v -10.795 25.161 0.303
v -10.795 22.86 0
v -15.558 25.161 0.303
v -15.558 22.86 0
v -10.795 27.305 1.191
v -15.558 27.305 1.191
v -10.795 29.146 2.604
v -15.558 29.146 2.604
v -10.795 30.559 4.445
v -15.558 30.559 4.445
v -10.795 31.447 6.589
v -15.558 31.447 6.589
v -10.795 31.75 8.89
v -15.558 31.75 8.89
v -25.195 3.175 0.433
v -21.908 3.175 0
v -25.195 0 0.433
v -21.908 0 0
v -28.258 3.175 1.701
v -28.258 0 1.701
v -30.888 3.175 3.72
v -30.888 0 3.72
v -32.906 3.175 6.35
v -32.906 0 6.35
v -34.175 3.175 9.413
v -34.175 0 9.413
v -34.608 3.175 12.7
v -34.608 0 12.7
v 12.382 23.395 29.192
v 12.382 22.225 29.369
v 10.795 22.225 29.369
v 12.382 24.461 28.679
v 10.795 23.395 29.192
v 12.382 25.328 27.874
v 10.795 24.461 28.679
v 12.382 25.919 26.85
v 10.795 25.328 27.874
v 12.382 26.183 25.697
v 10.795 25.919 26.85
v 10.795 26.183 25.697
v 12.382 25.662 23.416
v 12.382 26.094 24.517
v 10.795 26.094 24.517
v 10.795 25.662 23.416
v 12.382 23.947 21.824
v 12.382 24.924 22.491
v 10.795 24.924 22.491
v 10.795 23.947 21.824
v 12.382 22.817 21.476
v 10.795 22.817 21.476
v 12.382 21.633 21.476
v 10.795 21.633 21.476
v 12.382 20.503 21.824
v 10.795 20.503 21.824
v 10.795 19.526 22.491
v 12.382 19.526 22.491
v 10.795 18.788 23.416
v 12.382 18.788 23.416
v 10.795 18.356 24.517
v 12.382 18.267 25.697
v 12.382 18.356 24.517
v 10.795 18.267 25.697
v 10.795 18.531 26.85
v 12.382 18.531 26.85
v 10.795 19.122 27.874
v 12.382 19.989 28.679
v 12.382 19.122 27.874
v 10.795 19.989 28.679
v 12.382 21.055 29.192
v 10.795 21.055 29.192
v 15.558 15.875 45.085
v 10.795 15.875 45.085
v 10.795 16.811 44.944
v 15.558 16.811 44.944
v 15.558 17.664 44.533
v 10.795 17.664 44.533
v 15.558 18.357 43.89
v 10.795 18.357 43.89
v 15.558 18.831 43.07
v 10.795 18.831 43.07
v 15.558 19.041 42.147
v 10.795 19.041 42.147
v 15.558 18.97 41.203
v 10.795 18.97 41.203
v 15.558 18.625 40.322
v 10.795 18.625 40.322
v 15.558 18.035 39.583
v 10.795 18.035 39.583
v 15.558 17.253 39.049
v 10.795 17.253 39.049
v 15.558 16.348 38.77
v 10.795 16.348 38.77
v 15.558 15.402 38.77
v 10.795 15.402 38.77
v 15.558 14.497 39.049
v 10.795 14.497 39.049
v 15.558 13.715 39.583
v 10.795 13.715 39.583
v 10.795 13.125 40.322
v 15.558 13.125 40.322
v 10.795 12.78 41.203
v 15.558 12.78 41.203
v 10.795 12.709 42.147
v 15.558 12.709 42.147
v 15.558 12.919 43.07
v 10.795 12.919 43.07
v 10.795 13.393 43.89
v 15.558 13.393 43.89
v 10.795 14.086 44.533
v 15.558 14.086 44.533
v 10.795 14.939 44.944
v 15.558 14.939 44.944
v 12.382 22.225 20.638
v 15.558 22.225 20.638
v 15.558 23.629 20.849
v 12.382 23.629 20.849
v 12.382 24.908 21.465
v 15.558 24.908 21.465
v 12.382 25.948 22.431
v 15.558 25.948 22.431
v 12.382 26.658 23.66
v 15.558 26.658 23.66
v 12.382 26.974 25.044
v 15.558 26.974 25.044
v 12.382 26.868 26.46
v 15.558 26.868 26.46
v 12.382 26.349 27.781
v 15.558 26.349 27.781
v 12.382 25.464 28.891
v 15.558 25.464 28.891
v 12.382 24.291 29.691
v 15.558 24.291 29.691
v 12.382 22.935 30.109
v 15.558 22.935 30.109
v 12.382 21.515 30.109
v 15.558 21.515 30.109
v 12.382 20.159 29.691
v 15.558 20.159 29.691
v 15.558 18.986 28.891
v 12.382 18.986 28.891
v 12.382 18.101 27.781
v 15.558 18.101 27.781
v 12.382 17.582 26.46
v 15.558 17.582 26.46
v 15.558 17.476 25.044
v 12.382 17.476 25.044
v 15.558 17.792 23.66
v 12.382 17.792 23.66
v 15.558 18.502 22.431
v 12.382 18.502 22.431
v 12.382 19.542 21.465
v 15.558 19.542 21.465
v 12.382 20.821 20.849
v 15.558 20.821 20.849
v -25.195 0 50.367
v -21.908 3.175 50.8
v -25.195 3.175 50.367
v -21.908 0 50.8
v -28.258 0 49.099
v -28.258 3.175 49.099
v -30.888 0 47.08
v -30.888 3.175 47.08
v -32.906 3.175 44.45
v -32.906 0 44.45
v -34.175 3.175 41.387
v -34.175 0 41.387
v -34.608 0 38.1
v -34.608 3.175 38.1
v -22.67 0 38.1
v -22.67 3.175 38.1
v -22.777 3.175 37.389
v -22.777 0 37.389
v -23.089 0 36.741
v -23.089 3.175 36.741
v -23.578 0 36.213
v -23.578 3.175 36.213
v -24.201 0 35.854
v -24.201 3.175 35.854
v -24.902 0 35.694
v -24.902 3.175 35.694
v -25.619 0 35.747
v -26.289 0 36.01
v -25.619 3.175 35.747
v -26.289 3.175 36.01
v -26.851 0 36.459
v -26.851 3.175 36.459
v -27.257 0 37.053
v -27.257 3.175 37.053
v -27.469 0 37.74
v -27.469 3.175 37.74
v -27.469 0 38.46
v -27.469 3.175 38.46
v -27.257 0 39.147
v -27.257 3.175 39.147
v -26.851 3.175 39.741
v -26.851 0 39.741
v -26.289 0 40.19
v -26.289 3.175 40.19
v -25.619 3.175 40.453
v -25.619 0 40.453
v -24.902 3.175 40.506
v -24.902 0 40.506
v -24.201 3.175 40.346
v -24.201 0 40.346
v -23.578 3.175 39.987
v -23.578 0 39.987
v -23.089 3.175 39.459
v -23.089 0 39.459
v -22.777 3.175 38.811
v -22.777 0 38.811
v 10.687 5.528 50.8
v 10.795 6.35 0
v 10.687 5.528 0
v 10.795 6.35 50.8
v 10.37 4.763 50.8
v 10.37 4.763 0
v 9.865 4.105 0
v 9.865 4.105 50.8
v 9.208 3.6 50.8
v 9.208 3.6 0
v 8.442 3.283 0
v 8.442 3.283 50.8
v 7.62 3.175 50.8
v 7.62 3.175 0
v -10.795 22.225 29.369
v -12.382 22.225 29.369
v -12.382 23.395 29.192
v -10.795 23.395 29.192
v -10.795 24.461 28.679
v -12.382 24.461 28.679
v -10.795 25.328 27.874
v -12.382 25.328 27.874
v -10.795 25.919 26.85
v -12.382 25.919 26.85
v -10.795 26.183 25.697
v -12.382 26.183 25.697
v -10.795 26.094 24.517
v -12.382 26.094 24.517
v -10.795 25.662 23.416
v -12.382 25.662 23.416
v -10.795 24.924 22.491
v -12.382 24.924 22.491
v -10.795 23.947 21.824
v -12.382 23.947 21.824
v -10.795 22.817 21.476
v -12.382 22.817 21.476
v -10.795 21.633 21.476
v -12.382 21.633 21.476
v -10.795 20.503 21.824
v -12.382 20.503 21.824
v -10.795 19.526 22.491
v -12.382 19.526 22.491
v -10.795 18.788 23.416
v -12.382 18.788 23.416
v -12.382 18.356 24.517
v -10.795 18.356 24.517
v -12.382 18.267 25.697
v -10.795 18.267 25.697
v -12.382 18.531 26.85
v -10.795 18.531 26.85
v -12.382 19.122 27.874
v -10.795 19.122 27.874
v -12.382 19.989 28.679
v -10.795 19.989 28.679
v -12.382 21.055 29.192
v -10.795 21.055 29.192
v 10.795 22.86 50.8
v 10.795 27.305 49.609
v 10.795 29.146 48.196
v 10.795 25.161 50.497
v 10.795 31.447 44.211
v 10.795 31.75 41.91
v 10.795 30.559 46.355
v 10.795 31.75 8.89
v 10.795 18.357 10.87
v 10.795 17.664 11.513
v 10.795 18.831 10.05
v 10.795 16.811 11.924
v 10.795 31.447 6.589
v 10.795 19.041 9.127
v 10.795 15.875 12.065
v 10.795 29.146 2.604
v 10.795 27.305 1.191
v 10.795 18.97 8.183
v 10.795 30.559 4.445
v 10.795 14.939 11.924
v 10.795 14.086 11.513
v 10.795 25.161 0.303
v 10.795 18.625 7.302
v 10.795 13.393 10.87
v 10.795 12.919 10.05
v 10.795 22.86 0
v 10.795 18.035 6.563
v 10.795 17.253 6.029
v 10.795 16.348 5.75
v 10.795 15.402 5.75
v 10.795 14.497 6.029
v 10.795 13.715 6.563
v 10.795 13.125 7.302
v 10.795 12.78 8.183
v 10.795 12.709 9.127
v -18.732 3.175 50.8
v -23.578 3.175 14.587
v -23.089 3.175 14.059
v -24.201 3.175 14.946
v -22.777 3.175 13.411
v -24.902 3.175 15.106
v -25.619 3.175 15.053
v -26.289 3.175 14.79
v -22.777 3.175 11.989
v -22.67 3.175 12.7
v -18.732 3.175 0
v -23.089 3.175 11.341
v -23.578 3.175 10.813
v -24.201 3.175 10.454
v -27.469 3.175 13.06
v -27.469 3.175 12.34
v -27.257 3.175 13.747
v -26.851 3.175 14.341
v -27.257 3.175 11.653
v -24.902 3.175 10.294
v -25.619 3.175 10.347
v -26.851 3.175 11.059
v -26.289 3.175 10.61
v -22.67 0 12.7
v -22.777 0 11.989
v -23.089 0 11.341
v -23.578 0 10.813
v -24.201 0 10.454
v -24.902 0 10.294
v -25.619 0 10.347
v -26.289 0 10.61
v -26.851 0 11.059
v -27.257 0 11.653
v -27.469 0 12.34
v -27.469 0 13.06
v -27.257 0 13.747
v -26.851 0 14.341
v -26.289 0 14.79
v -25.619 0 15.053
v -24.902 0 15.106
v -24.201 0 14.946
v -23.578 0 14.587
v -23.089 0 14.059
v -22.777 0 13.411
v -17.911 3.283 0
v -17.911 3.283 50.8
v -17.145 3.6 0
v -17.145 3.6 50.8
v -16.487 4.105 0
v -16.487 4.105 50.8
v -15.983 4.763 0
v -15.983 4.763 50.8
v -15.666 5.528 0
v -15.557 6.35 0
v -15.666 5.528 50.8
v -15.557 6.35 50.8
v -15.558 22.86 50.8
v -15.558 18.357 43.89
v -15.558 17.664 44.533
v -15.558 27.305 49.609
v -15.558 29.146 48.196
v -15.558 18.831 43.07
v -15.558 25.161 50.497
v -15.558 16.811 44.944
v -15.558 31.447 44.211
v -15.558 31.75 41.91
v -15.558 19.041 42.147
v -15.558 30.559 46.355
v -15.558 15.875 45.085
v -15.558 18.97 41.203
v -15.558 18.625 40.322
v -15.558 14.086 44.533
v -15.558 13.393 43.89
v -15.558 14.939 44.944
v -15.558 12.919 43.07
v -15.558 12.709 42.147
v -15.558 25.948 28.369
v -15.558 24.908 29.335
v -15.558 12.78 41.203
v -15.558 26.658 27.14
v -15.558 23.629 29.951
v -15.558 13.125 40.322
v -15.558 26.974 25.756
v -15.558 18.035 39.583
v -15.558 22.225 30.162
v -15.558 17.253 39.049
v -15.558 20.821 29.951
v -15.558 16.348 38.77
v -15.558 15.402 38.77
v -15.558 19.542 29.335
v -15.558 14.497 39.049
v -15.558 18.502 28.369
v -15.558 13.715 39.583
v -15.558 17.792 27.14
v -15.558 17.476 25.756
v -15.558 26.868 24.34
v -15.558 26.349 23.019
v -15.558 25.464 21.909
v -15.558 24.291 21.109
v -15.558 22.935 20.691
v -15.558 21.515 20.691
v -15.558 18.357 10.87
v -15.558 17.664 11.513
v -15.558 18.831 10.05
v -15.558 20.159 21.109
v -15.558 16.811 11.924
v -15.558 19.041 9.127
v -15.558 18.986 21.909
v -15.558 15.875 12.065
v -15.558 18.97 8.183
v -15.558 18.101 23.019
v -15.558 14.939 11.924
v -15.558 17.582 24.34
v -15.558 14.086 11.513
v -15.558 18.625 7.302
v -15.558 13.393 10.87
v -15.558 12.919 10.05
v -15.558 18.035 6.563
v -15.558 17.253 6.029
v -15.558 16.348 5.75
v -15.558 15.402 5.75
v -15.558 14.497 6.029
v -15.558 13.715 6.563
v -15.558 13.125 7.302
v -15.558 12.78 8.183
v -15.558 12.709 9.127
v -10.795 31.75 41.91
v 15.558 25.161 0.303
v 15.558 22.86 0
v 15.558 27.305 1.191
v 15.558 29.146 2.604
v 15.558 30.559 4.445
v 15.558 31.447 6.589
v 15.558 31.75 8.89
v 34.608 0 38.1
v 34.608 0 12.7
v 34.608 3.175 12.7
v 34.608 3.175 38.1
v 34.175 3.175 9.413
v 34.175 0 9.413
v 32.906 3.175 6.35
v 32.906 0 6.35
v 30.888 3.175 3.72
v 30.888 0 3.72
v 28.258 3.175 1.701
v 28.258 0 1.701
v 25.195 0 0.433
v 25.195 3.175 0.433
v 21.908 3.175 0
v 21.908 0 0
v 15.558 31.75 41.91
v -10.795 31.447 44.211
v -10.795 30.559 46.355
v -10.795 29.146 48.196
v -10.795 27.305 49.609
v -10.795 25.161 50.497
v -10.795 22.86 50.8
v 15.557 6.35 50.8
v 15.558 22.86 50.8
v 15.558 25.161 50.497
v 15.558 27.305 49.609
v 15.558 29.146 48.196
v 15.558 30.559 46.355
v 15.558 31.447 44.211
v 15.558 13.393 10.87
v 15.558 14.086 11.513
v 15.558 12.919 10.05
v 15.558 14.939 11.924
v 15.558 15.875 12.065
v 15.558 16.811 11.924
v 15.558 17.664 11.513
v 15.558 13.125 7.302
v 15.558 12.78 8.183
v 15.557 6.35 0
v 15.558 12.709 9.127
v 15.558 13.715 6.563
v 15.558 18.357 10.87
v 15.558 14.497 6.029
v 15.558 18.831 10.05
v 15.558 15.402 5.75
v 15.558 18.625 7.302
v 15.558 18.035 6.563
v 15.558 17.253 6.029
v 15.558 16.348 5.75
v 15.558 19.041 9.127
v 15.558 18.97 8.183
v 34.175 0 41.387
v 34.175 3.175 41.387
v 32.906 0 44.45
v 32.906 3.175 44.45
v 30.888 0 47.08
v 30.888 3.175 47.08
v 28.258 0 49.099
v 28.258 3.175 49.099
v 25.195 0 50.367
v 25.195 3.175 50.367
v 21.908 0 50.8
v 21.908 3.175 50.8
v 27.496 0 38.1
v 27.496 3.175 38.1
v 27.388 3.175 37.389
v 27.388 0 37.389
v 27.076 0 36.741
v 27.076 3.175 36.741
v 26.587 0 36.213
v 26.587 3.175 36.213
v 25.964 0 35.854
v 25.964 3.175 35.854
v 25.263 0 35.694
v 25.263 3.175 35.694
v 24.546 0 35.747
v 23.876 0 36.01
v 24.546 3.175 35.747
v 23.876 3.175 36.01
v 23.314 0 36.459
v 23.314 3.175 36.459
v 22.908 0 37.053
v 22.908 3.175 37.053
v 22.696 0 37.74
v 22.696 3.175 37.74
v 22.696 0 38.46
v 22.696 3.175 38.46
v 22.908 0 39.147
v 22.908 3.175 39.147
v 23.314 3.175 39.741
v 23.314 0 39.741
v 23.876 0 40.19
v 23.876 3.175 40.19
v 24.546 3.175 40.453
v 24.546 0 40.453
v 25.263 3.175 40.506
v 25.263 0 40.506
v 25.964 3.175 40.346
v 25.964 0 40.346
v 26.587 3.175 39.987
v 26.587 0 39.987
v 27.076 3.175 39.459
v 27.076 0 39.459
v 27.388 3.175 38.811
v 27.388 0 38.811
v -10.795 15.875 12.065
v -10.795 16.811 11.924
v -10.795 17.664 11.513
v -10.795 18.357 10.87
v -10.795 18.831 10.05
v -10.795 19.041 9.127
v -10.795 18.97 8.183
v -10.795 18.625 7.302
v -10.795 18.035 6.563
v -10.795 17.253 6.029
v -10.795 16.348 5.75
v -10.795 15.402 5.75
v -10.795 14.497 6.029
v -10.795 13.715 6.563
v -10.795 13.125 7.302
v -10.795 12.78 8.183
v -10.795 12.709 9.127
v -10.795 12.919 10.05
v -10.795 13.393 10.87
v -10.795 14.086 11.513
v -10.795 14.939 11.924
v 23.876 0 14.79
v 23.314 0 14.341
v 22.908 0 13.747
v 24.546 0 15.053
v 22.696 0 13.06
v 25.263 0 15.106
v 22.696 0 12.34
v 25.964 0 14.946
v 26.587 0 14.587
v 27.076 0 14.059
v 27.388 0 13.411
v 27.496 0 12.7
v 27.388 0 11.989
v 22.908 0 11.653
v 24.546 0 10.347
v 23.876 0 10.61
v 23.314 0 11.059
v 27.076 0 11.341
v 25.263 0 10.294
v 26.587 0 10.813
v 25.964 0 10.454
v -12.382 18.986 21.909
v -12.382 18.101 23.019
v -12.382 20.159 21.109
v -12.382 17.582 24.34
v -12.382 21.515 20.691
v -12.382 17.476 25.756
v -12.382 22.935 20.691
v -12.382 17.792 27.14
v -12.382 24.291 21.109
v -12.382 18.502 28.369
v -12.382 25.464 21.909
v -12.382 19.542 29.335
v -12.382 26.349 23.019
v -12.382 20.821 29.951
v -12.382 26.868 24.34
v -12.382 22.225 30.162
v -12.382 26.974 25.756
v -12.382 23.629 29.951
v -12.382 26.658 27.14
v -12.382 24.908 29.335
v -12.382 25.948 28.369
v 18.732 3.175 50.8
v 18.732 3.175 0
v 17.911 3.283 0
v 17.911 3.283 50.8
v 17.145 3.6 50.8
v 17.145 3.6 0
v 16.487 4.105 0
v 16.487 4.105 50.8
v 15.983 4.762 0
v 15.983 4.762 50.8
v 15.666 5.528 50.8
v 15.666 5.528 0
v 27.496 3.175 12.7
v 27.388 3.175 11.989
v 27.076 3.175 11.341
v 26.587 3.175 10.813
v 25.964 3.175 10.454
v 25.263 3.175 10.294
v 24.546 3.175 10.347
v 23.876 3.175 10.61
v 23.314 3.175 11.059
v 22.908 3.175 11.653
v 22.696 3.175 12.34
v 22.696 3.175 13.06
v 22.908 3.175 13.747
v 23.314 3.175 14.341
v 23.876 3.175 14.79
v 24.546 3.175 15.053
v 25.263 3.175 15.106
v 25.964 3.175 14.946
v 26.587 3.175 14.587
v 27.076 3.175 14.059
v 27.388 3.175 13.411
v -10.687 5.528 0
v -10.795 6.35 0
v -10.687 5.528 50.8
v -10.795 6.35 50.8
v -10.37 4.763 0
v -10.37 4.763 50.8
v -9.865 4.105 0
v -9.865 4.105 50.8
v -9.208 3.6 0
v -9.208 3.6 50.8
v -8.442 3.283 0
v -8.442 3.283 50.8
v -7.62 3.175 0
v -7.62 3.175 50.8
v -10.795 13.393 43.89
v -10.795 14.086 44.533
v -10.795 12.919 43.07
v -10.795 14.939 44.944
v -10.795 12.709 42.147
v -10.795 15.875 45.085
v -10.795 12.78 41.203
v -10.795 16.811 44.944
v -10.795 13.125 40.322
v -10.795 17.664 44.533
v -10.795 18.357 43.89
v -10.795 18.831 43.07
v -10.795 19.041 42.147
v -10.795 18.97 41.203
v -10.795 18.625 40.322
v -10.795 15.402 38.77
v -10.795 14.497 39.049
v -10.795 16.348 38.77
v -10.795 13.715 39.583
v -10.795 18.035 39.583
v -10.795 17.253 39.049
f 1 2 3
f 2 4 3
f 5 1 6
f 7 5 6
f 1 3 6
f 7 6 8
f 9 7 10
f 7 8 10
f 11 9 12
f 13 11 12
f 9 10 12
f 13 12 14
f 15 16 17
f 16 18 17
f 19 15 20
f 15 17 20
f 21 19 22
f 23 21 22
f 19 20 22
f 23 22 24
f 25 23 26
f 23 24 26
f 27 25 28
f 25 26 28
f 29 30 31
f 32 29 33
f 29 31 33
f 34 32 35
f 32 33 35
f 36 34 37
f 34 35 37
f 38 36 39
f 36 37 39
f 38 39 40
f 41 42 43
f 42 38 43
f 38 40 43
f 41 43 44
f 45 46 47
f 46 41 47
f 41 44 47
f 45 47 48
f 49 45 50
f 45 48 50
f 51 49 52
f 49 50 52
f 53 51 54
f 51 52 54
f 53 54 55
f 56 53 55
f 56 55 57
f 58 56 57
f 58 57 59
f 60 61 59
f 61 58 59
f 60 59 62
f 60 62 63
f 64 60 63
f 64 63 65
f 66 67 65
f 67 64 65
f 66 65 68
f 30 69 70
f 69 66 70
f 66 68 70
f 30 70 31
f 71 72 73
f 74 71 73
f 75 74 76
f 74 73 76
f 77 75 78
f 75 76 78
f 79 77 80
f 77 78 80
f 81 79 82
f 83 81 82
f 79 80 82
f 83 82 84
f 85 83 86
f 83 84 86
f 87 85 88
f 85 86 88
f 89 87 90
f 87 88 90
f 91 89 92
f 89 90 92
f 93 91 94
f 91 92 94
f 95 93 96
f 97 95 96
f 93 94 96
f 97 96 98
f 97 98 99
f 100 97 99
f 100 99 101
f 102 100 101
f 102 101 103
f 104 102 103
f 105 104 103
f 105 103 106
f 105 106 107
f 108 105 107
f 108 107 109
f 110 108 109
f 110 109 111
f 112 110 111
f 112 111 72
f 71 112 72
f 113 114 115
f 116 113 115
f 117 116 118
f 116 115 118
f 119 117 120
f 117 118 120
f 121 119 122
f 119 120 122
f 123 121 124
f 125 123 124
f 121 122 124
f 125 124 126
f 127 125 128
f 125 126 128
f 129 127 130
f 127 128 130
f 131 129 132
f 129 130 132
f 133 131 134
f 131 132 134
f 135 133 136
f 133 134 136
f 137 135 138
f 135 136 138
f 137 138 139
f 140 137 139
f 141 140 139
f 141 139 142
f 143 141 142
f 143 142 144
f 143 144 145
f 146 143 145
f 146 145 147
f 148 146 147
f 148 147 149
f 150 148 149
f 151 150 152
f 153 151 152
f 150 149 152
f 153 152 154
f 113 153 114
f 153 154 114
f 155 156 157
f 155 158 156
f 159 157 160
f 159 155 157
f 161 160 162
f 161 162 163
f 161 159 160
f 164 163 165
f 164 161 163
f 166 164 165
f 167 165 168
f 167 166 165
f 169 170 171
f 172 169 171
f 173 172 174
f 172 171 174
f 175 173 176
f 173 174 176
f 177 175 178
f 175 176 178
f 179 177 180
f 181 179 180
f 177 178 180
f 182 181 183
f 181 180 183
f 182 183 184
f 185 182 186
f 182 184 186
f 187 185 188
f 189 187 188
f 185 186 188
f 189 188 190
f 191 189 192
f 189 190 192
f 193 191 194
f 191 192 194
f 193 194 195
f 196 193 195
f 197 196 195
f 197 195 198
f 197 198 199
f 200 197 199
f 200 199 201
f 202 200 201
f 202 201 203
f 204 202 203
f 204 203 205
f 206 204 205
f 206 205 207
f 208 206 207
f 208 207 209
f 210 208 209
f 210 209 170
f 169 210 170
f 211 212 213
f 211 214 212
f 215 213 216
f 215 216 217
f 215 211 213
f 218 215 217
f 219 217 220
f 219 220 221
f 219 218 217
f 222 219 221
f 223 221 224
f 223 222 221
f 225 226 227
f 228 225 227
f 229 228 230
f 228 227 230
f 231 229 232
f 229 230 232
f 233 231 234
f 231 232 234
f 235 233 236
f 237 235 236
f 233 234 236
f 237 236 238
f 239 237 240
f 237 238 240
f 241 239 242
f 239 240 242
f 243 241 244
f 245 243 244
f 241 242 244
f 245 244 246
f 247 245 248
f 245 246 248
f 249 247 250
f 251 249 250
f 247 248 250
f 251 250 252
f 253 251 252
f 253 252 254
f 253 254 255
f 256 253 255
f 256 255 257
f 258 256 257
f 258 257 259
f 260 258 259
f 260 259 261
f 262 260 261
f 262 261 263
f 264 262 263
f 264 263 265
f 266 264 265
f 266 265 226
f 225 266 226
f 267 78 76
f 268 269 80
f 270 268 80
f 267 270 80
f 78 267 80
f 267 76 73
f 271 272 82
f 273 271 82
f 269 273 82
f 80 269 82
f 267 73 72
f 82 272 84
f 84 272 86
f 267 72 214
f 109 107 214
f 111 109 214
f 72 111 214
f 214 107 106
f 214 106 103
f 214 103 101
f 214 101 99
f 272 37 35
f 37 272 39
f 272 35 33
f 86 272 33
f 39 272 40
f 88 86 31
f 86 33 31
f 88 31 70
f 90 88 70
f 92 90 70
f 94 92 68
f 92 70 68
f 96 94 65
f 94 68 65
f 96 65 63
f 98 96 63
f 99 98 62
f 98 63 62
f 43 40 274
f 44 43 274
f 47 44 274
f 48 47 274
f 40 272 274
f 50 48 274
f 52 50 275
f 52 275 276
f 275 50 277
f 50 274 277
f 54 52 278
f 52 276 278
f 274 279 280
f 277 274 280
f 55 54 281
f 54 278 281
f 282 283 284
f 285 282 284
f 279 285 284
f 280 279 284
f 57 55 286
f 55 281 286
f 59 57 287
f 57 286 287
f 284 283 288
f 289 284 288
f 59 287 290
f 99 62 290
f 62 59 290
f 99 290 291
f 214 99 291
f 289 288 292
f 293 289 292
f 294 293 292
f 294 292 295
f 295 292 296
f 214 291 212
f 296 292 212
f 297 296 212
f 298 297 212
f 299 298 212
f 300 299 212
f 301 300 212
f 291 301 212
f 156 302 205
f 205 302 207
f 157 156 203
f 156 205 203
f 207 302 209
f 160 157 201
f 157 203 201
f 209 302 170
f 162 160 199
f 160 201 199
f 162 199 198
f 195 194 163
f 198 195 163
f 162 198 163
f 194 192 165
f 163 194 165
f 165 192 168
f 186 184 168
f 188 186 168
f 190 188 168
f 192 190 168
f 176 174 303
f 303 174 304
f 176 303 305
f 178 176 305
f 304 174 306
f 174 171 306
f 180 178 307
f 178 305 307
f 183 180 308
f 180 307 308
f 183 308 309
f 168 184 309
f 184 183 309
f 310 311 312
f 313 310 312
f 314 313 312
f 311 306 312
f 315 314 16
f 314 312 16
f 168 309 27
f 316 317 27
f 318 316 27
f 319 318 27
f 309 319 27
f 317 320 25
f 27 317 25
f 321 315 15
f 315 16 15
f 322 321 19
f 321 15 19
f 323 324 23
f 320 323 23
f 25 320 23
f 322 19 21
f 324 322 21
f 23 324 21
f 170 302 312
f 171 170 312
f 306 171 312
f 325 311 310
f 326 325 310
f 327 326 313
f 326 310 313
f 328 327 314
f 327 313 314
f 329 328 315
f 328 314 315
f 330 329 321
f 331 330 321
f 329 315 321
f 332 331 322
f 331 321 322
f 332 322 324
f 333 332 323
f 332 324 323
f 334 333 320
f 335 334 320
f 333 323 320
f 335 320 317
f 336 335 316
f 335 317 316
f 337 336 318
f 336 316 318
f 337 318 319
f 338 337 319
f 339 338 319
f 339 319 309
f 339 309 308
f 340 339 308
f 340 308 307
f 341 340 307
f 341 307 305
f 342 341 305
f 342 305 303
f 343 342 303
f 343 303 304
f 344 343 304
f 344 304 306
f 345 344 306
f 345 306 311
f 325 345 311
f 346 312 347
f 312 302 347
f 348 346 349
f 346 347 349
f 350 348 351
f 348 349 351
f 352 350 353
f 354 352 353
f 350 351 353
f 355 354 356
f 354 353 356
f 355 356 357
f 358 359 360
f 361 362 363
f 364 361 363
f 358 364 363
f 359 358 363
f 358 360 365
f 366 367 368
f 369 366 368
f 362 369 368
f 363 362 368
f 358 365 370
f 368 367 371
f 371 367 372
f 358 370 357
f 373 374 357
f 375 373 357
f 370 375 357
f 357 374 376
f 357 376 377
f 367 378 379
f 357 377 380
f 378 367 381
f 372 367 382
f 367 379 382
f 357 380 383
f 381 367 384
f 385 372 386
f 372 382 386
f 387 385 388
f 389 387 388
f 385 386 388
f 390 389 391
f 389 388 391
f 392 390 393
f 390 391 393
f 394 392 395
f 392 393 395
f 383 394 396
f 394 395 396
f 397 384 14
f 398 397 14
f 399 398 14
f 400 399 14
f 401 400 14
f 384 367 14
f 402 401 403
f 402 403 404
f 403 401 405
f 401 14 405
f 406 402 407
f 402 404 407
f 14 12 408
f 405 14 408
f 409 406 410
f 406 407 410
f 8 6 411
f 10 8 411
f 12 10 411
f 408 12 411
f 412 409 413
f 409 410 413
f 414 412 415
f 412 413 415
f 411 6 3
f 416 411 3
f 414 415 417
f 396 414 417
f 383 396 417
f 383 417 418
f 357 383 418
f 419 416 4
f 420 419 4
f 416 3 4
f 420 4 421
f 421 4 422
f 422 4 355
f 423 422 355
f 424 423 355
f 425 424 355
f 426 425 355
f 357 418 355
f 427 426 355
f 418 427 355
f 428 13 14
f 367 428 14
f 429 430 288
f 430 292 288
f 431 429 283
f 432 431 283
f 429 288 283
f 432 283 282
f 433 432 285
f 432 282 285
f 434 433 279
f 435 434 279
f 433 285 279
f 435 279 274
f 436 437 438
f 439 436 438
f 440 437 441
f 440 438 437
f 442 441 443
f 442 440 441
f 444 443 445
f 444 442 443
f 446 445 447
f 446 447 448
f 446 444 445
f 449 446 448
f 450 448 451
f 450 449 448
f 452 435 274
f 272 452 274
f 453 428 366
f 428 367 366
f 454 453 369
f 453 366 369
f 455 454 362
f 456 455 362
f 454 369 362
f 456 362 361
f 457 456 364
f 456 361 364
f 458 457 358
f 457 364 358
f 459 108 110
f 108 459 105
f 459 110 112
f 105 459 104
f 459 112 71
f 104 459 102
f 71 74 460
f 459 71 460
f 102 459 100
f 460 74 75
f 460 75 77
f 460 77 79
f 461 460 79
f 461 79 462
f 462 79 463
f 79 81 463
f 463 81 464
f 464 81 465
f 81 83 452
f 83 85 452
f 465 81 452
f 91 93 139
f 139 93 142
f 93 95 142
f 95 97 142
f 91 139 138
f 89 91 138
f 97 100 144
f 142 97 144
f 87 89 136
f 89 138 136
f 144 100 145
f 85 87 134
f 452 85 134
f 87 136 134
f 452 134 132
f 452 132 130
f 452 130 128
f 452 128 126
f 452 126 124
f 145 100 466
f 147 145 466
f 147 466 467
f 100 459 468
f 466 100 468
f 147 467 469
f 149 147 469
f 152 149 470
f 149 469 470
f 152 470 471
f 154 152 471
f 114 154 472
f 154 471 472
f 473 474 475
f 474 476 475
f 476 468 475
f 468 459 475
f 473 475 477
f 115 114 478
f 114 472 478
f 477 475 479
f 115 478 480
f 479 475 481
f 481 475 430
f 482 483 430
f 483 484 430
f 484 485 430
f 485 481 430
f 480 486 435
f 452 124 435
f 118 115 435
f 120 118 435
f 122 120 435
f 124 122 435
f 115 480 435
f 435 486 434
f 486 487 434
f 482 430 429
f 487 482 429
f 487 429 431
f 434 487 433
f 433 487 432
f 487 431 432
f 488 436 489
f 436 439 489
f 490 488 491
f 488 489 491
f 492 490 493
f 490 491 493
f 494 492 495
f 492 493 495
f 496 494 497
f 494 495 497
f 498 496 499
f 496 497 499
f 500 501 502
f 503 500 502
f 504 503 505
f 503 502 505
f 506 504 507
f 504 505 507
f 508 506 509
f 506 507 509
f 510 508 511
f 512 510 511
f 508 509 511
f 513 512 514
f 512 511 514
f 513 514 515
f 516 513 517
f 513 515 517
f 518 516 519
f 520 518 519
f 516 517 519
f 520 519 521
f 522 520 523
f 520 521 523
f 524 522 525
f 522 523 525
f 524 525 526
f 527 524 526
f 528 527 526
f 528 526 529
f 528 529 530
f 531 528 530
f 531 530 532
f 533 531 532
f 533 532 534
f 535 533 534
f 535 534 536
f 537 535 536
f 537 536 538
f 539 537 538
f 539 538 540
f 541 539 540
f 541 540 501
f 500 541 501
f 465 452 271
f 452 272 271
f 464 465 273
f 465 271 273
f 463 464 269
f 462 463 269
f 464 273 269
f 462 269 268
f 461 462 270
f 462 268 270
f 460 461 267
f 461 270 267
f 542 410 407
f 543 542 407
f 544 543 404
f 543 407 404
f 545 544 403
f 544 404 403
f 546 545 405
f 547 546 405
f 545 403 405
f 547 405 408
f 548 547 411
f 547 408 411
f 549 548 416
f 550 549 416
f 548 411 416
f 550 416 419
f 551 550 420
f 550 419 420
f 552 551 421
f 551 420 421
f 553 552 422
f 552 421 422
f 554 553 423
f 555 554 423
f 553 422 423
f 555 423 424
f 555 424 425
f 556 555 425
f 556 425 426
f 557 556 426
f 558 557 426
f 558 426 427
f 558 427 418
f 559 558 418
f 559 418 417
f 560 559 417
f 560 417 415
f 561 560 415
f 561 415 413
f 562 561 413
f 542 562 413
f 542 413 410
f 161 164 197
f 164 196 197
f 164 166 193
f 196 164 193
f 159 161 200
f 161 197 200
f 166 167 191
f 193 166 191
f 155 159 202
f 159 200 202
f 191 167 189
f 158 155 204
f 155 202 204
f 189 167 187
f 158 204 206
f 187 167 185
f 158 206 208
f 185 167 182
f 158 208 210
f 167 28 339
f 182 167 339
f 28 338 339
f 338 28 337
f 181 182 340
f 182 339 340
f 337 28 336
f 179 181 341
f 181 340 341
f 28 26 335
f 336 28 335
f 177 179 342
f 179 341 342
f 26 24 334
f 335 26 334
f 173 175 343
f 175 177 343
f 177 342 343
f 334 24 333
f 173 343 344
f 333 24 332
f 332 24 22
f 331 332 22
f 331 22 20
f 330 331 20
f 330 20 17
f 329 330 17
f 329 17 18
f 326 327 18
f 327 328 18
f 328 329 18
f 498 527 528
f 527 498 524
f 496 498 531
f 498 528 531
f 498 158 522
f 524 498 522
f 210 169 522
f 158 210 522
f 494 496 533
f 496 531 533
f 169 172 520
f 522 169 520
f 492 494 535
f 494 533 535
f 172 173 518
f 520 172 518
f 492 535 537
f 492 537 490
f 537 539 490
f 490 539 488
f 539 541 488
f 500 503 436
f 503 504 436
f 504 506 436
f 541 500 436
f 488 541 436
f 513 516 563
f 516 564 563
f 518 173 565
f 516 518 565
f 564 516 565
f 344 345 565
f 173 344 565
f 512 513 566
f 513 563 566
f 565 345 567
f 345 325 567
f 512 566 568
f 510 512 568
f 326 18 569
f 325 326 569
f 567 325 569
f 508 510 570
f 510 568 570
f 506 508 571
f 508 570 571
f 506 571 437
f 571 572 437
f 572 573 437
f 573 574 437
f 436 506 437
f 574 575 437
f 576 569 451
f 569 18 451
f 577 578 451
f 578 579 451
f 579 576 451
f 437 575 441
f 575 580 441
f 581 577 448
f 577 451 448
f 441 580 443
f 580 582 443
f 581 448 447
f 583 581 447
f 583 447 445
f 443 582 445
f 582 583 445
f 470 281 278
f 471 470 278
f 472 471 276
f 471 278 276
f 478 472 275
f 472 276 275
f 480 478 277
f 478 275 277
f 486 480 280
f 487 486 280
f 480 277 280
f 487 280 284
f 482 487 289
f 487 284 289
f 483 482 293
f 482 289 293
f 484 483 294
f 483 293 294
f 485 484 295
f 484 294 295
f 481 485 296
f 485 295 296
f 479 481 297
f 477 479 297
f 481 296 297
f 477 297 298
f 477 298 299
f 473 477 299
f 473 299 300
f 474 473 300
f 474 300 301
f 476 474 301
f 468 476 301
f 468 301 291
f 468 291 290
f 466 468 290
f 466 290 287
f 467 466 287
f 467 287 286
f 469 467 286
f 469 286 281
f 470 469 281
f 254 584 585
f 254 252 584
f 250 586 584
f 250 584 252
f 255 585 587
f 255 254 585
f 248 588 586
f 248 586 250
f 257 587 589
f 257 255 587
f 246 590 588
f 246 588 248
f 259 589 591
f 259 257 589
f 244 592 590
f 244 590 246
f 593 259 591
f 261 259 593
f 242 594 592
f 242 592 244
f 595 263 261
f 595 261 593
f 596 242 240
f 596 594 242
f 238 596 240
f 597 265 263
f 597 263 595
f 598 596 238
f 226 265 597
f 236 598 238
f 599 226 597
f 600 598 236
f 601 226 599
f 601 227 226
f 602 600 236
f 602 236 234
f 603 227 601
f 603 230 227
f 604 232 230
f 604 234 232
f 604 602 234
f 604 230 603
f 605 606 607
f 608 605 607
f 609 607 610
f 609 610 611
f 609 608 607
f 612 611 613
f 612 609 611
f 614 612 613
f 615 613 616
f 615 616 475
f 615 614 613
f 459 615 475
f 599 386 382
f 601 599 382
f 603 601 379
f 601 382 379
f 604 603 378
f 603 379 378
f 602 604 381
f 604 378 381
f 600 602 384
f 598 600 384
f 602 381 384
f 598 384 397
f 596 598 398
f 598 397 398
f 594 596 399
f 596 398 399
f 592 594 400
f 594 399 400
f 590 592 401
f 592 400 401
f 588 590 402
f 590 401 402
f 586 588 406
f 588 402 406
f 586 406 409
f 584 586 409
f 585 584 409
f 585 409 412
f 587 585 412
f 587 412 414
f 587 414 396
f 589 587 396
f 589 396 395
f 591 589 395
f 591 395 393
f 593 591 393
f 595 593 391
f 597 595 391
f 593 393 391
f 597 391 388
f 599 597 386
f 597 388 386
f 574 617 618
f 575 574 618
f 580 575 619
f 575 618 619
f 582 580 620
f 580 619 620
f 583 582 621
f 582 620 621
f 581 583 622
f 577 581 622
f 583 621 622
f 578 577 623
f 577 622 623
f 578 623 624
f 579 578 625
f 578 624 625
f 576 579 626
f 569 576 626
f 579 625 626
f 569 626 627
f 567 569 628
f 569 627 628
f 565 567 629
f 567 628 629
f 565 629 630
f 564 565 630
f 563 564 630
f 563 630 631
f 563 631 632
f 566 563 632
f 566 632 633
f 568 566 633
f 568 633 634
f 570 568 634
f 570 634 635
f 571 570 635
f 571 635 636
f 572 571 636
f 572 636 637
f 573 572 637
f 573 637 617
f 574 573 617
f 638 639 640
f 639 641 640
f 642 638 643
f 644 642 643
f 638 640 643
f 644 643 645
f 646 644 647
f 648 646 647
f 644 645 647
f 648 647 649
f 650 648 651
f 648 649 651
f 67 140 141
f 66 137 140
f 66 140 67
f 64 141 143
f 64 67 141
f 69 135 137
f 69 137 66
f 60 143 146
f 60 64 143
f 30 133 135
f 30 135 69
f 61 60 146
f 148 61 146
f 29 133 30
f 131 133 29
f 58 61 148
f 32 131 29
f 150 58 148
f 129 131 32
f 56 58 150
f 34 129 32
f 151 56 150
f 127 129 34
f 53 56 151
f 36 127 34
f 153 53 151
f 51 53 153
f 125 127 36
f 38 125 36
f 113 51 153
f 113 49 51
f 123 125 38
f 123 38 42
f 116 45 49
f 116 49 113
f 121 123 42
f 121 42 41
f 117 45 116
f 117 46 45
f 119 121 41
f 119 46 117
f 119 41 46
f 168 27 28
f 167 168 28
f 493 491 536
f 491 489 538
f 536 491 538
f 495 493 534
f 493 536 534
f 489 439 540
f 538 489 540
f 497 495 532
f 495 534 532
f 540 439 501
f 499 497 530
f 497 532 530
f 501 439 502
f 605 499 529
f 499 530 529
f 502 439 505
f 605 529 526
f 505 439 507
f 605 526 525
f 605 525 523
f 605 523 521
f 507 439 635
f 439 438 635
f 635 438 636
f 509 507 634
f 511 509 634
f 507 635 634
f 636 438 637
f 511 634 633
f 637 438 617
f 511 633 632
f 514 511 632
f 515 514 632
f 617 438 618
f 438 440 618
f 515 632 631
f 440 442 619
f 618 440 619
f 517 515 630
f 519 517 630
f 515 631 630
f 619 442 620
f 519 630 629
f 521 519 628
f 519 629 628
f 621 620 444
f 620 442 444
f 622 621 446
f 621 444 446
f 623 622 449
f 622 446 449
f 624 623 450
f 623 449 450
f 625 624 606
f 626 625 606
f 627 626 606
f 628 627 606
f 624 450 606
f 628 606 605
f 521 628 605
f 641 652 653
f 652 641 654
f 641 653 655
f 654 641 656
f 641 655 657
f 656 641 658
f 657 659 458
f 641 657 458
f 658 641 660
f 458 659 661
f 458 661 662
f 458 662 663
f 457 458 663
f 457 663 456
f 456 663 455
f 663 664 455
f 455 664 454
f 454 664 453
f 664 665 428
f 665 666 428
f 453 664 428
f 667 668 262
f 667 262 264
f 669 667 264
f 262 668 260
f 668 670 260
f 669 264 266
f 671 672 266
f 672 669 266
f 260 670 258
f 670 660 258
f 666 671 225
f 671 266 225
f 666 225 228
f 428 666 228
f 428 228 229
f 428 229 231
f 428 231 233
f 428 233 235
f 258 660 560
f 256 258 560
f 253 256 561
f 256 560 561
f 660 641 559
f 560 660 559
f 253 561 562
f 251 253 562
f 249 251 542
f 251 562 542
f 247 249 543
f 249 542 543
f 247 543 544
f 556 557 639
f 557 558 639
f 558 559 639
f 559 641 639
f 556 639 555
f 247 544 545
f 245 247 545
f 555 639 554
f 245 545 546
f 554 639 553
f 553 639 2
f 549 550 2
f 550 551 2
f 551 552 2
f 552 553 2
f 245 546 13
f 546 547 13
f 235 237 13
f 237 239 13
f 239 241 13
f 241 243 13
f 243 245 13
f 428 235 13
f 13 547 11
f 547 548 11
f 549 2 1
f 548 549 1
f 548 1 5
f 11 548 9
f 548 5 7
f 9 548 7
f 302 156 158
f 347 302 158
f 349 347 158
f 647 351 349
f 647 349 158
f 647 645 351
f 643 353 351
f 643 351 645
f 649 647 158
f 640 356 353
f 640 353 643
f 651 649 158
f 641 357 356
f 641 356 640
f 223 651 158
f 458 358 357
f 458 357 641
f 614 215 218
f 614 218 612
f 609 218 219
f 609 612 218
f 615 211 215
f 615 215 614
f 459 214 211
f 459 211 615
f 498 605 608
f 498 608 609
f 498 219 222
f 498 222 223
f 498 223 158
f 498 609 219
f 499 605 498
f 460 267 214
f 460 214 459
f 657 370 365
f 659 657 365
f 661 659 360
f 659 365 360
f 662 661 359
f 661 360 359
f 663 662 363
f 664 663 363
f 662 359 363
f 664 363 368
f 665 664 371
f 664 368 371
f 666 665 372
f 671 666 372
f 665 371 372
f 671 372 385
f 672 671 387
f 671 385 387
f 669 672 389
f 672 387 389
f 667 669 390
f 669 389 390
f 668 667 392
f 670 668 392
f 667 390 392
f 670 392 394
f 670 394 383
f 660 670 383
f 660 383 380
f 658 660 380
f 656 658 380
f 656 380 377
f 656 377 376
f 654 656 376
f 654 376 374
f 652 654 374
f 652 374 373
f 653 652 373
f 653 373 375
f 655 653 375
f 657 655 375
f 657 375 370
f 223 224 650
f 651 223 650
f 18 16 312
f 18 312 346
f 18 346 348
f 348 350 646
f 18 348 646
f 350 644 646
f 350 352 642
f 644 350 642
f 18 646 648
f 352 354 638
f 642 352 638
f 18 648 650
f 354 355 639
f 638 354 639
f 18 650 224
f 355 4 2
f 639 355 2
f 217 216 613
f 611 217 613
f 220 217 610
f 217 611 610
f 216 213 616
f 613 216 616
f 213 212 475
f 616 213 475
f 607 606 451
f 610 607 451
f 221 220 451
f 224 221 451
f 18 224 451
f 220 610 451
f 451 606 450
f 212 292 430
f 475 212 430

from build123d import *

# Parameters (mm, degrees)
BOSS_EXTRUDE2_DEPTH = 50.8
SKETCH4_R           = 3.175
SKETCH4_R_2         = 3.96875
CUT_EXTRUDE1_DEPTH  = 79.13596947
SKETCH5_R           = 2.413
CUT_EXTRUDE2_DEPTH  = 68.785320544
SKETCH4_3_R         = 4.7625
SKETCH4_3_R_2       = 3.96875
CUT_EXTRUDE3_DEPTH  = 3.175
CUT_EXTRUDE4_START  = -3.175
SKETCH6_R           = 4.7625
SKETCH6_R_2         = 3.96875
CUT_EXTRUDE4_DEPTH  = 3.175
FILLET1_R           = 12.7
FILLET2_R           = 3.175
FILLET3_R           = 8.89


with BuildPart() as part:
    # Sketch3 → Boss-Extrude2 (new body)
    with BuildSketch(Plane.XY):
        Polygon((-34.6075, 0), (34.6075, 0), (34.6075, 3.175), (15.5575, 3.175), (15.5575, 31.75), (10.795, 31.75), (10.795, 3.175), (-10.795, 3.175), (-10.795, 31.75), (-15.5575, 31.75), (-15.5575, 3.175), (-34.6075, 3.175), align=None)
    extrude(amount=BOSS_EXTRUDE2_DEPTH)

    # Sketch4 → Cut-Extrude1 (cut, through all)
    with BuildSketch(Plane.ZY.offset(15.5575)):
        with Locations((8.89, 15.875)):
            Circle(SKETCH4_R)
        with Locations((41.91, 15.875)):
            Circle(SKETCH4_R)
        with Locations((25.4, 22.225)):
            Circle(SKETCH4_R_2)
    extrude(amount=-CUT_EXTRUDE1_DEPTH, mode=Mode.SUBTRACT)

    # Sketch5 → Cut-Extrude2 (cut, through all)
    with BuildSketch(Plane(origin=(0, 3.175, 0), x_dir=(1, 0, 0), z_dir=(0, 1, 0))):
        with Locations((-25.0825, -12.7)):
            Circle(SKETCH5_R)
        with Locations((-25.0825, -38.1)):
            Circle(SKETCH5_R)
        with Locations((25.0825, -12.7)):
            Circle(SKETCH5_R)
        with Locations((25.0825, -38.1)):
            Circle(SKETCH5_R)
    extrude(amount=-CUT_EXTRUDE2_DEPTH, mode=Mode.SUBTRACT)

    # Sketch4<3> → Cut-Extrude3 (cut)
    with BuildSketch(Plane.ZY.offset(15.5575)):
        with Locations((25.4, 22.225)):
            Circle(SKETCH4_3_R)
        with Locations((25.4, 22.225)):
            Circle(SKETCH4_3_R_2, mode=Mode.SUBTRACT)
    extrude(amount=-CUT_EXTRUDE3_DEPTH, mode=Mode.SUBTRACT)

    # Sketch6 → Cut-Extrude4 (cut)
    with BuildSketch(Plane(origin=(15.5575, 0, 0), x_dir=(0, 0, -1), z_dir=(1, 0, 0)).offset(CUT_EXTRUDE4_START)):
        with Locations((-25.4, 22.225)):
            Circle(SKETCH6_R)
        with Locations((-25.4, 22.225)):
            Circle(SKETCH6_R_2, mode=Mode.SUBTRACT)
    extrude(amount=CUT_EXTRUDE4_DEPTH, mode=Mode.SUBTRACT)

    # Fillet1
    fillet1_edges = [part.edges().sort_by_distance(p)[0] for p in [
        (34.6075, 1.5875, 0),
        (34.6075, 1.5875, 50.8),
        (-34.6075, 1.5875, 50.8),
        (-34.6075, 1.5875, 0),
    ]]
    fillet(fillet1_edges, radius=FILLET1_R)

    # Fillet2
    fillet2_edges = [part.edges().sort_by_distance(p)[0] for p in [
        (15.5575, 3.175, 25.4),
        (10.795, 3.175, 25.4),
        (-10.795, 3.175, 25.4),
        (-15.5575, 3.175, 25.4),
    ]]
    fillet(fillet2_edges, radius=FILLET2_R)

    # Fillet3
    fillet3_edges = [part.edges().sort_by_distance(p)[0] for p in [
        (-13.17625, 31.75, 50.8),
        (13.17625, 31.75, 50.8),
        (13.17625, 31.75, 0),
        (-13.17625, 31.75, 0),
    ]]
    fillet(fillet3_edges, radius=FILLET3_R)


solid = part.part
